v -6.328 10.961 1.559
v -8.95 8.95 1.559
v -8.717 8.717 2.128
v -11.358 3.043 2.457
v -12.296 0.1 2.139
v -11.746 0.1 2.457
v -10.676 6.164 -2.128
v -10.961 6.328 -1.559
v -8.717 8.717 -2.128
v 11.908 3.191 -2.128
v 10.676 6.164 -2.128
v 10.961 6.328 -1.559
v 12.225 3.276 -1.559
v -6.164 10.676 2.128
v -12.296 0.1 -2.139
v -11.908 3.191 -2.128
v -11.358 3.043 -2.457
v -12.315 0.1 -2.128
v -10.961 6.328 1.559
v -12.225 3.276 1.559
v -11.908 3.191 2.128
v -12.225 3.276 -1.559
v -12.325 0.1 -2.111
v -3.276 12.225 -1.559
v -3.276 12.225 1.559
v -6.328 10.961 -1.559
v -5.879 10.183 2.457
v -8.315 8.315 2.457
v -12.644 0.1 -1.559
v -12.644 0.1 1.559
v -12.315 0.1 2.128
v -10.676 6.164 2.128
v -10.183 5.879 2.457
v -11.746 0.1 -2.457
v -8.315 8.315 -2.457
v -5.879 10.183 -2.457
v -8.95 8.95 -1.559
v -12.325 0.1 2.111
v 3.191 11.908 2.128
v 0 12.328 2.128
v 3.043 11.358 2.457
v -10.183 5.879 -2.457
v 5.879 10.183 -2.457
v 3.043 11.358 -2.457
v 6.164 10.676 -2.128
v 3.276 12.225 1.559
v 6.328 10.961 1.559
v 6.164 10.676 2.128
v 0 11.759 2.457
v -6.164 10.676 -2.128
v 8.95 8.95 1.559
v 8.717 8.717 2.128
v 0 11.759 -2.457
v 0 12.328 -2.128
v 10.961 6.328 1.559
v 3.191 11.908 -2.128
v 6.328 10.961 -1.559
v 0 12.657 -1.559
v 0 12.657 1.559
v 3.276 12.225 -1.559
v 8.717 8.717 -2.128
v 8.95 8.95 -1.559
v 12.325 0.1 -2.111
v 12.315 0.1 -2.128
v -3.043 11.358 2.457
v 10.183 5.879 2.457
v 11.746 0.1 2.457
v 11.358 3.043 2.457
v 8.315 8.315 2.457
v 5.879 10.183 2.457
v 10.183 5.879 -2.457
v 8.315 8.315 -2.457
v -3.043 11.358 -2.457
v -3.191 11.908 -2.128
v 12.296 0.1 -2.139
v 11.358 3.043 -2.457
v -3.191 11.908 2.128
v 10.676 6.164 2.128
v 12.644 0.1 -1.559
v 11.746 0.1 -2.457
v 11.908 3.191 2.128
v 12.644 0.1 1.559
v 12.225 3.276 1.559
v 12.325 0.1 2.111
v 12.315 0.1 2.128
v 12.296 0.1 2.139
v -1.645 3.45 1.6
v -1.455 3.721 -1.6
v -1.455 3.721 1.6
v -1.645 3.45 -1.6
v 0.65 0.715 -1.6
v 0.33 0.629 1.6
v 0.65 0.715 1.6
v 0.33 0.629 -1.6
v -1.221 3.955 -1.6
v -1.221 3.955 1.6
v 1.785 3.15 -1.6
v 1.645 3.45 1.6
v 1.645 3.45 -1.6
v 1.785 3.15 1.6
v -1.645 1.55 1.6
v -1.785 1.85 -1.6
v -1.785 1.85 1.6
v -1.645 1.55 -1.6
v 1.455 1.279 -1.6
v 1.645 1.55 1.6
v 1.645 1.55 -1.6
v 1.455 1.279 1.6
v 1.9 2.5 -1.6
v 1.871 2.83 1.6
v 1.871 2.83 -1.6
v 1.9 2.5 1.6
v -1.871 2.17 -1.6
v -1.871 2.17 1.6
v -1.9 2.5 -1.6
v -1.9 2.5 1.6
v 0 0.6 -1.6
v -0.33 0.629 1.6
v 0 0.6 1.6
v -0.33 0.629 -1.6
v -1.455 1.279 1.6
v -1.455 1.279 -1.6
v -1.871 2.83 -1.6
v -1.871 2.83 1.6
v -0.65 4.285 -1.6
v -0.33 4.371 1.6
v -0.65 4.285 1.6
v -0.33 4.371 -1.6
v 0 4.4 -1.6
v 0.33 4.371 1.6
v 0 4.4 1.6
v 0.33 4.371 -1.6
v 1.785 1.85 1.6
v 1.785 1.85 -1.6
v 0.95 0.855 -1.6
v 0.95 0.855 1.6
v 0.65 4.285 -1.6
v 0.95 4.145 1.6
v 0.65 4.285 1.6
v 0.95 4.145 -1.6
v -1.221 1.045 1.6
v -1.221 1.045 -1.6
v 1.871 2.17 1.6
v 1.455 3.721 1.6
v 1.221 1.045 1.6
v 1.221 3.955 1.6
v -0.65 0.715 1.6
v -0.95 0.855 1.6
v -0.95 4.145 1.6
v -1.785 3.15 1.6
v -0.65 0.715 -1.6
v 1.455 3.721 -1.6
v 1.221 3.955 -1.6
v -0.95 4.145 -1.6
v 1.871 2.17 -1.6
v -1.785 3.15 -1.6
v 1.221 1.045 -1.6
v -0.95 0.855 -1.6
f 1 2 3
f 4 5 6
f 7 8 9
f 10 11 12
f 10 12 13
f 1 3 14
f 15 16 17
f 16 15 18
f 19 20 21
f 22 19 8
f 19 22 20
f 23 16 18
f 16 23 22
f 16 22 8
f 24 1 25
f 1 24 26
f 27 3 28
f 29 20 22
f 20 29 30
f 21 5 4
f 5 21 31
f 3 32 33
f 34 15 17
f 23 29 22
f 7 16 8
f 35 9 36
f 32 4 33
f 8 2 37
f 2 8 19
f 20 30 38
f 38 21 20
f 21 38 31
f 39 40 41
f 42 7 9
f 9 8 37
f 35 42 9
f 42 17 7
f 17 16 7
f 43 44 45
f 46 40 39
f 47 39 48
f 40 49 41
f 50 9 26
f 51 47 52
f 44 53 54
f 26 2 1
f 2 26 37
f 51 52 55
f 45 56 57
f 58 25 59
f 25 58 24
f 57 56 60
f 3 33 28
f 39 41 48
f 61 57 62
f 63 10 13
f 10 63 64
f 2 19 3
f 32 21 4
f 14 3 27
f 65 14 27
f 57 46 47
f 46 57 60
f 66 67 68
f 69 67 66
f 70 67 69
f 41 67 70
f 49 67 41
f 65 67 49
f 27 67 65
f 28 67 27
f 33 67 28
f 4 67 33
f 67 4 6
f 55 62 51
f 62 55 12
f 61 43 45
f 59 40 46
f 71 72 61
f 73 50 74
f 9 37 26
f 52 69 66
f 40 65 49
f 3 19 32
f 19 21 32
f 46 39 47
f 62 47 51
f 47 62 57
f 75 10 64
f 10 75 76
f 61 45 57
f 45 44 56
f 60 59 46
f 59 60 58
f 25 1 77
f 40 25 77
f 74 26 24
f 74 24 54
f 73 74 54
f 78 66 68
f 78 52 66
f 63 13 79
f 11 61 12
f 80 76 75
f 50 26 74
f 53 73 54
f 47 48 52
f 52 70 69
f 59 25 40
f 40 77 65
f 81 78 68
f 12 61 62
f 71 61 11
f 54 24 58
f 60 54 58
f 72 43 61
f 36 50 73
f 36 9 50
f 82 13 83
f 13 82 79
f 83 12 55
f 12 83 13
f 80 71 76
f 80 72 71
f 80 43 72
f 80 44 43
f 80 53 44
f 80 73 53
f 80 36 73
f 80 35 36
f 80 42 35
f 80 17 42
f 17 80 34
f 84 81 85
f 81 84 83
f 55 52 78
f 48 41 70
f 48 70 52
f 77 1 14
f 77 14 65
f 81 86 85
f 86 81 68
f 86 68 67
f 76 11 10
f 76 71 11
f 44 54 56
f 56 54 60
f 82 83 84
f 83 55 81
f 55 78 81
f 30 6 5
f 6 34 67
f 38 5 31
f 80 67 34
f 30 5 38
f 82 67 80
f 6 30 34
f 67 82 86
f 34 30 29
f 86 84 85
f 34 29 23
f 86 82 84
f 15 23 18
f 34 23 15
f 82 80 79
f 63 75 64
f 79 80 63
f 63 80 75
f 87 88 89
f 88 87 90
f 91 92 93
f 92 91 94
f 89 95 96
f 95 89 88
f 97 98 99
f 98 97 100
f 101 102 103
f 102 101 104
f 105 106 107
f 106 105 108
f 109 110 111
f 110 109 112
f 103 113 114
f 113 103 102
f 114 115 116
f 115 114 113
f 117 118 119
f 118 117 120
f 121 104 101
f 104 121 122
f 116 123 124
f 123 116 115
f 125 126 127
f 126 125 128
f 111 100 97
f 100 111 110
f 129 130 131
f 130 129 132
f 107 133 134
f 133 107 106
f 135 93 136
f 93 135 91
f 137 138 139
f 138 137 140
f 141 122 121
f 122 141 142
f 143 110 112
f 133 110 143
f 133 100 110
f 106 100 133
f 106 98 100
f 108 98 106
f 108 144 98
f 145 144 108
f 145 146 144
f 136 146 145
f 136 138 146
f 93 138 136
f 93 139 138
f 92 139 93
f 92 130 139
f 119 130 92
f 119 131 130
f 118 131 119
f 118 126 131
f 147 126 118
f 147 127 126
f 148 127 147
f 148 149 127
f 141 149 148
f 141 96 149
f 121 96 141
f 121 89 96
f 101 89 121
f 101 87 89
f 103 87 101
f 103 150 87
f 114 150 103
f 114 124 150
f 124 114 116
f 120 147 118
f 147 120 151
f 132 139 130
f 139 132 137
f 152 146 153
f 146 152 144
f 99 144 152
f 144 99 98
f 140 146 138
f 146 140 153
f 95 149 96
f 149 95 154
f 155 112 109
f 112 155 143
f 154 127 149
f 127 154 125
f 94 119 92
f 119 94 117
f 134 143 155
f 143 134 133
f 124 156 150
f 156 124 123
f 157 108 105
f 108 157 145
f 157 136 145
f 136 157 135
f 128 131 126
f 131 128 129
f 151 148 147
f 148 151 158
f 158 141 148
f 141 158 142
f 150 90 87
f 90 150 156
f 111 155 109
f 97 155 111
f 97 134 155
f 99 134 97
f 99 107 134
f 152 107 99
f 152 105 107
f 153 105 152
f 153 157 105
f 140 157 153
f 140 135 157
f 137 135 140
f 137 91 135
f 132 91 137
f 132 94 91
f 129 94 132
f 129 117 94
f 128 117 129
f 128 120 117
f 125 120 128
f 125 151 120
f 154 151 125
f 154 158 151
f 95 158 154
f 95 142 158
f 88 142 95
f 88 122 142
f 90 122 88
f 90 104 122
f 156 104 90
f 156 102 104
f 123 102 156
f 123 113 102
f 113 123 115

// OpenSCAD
//
// bush.scad

// unit is mm

inch = 25.4;
o2 = 0.2;
rr = inch / 20;


module bush(height=0) {
  h = 5;
  bd = 3;
  br = bd / 2;
  module bal() { sphere(r=rr, $fn=12); }
  module balcyl() {
    cylinder(r=br + 2 * o2, h=br * 2 + o2, center=true, $fn=36);
  }
  difference() {
    hull() {
      for (a = [ 0 : 15 : 180 ])
        rotate([ 0, 0, a ]) {
          translate([ inch / 2 - rr, 0, -h/2 + rr ]) bal();
          translate([ inch / 2 - rr, 0, h/2 - rr ]) bal();
        }
      translate([ inch / 2 - rr, -inch, -h/2 + rr ]) bal();
      translate([ inch / 2 - rr, -inch, h/2 - rr ]) bal();
      translate([ -inch / 2 + rr, -inch, -h/2 + rr ]) bal();
      translate([ -inch / 2 + rr, -inch, h/2 - rr ]) bal();
    }
    translate([ 0, -inch - height, 0 ])
      cube(size=[ inch + o2, 2 * inch + o2, 5 + o2 ], center=true);

    #translate([ 0, br + 5 * o2 - height, 0 ]) balcyl();

    if (height > 0) #translate([ 0, inch / 2 - bd, 0 ]) balcyl();

    if (height >= inch) {
      #translate([ 0, -inch / 2, 0 ]) balcyl();
      #translate([ inch / 2 - bd, -inch / 2, 0 ]) balcyl();
      #translate([ -inch / 2 + bd, -inch / 2, 0 ]) balcyl();
    }
  }
}

//translate([ -2 * inch, 0, 0 ]) bush(0.9);
//translate([ -inch, 0, 0 ]) bush(1.1);
bush();
//translate([ inch * 1.2, 0, 0 ]) bush(inch / 3);
//translate([ inch * 2.2, 0, 0 ]) bush(inch / 2);
//translate([ inch * 2.2, 0, 0 ]) bush(inch / 1); // door ;-)
